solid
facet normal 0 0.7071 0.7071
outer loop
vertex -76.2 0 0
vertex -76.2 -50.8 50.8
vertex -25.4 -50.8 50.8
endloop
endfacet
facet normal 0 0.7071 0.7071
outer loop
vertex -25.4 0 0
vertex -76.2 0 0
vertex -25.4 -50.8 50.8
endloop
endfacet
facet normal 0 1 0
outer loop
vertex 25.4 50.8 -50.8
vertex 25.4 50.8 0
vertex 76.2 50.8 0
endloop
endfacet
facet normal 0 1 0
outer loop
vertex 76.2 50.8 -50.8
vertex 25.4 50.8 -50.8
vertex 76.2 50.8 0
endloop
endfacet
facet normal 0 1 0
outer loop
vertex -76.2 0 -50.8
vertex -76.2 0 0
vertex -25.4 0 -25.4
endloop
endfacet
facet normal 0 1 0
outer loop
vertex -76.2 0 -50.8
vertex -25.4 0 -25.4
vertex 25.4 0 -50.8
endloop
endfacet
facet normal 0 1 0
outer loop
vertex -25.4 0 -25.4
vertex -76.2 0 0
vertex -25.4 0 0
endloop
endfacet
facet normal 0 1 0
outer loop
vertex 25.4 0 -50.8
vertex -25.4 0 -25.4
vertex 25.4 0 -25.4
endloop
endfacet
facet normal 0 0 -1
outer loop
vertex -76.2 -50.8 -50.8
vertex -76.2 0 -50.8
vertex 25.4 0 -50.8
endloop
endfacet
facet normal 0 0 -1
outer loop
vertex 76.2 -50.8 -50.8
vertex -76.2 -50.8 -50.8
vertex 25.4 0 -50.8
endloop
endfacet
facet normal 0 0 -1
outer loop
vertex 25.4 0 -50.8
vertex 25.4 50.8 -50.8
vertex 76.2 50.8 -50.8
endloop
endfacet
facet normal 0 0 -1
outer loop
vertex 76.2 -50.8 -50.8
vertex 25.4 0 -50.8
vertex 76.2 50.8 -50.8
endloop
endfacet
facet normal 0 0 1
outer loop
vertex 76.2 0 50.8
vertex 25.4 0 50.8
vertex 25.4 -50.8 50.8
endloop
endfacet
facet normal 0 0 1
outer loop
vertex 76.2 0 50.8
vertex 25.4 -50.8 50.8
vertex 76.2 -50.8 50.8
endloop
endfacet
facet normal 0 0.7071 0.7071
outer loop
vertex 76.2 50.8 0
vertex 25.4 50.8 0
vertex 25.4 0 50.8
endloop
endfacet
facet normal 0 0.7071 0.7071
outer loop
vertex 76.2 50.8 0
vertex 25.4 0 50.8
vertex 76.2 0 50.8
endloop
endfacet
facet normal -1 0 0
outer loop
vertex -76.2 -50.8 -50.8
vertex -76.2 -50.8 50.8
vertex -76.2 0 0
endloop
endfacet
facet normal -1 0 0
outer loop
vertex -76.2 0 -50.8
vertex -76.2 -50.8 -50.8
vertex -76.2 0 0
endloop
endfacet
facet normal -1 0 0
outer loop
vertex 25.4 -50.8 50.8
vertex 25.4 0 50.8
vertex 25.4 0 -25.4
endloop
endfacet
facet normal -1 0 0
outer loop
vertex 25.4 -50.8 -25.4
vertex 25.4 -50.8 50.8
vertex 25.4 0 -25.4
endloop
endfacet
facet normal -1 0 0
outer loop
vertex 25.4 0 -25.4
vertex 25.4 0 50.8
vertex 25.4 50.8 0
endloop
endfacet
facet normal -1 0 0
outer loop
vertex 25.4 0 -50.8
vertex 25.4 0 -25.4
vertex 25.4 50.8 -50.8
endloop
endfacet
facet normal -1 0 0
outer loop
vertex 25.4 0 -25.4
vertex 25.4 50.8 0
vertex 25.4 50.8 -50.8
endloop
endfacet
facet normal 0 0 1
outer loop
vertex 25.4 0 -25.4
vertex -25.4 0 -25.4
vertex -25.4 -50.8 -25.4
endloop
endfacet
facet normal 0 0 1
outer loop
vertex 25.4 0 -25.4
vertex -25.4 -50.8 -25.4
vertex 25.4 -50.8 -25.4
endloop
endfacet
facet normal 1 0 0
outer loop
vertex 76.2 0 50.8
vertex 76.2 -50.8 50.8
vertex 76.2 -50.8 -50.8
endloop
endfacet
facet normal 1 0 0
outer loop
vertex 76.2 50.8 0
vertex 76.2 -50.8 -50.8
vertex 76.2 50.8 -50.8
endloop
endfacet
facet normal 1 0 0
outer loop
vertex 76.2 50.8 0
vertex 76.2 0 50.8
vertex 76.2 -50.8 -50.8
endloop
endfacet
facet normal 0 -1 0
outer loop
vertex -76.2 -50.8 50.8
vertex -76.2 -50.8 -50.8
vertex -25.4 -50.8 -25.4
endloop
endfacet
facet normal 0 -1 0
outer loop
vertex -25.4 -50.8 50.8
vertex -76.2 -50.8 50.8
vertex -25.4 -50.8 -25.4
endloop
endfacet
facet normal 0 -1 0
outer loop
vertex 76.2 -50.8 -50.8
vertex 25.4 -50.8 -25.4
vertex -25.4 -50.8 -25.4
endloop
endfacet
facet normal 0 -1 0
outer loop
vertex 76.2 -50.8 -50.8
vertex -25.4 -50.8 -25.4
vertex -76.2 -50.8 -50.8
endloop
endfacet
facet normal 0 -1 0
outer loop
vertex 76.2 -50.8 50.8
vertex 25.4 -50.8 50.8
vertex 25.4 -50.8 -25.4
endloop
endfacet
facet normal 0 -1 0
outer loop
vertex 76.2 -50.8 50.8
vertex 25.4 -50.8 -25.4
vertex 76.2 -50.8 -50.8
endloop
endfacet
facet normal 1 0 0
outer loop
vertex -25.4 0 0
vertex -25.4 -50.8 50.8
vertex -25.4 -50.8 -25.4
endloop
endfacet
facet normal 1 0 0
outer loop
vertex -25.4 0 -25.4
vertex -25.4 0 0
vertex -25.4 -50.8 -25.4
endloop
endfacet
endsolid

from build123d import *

# Parameters (mm, degrees)
SKETCH2_W           = 152.4
SKETCH2_H           = 101.6
BOSS_EXTRUDE1_DEPTH = 50.8
SKETCH4_W           = 101.6
SKETCH4_H           = 50.8
CUT_EXTRUDE1_DEPTH  = 137.783186101
SKETCH5_W           = 50.8
SKETCH5_H           = 76.2
CUT_EXTRUDE2_DEPTH  = 105.726882891
CHAMFER1_SIZE       = 50.8


with BuildPart() as part:
    # Sketch2 → Boss-Extrude1 (new, symmetric)
    with BuildSketch(Plane.XY):
        Rectangle(SKETCH2_W, SKETCH2_H)
    extrude(amount=BOSS_EXTRUDE1_DEPTH, both=True)

    # Sketch4 → Cut-Extrude1 (cut, through all)
    with BuildSketch(Plane.XY.offset(50.8)):
        with Locations((-25.4, 25.4)):
            Rectangle(SKETCH4_W, SKETCH4_H)
    extrude(amount=-CUT_EXTRUDE1_DEPTH, mode=Mode.SUBTRACT)

    # Sketch5 → Cut-Extrude2 (cut, through all)
    with BuildSketch(Plane(origin=(0, 0, 0), x_dir=(1, 0, 0), z_dir=(0, 1, 0))):
        with Locations((0, -12.7)):
            Rectangle(SKETCH5_W, SKETCH5_H)
    extrude(amount=-CUT_EXTRUDE2_DEPTH, mode=Mode.SUBTRACT)

    # Chamfer1
    chamfer1_edges = [part.edges().sort_by_distance(p)[0] for p in [
        (-50.8, 0, 50.8),
        (50.8, 50.8, 50.8),
    ]]
    chamfer(chamfer1_edges, length=CHAMFER1_SIZE - 0.0001)  # a hair under: the kernel refuses the full size


solid = part.part
